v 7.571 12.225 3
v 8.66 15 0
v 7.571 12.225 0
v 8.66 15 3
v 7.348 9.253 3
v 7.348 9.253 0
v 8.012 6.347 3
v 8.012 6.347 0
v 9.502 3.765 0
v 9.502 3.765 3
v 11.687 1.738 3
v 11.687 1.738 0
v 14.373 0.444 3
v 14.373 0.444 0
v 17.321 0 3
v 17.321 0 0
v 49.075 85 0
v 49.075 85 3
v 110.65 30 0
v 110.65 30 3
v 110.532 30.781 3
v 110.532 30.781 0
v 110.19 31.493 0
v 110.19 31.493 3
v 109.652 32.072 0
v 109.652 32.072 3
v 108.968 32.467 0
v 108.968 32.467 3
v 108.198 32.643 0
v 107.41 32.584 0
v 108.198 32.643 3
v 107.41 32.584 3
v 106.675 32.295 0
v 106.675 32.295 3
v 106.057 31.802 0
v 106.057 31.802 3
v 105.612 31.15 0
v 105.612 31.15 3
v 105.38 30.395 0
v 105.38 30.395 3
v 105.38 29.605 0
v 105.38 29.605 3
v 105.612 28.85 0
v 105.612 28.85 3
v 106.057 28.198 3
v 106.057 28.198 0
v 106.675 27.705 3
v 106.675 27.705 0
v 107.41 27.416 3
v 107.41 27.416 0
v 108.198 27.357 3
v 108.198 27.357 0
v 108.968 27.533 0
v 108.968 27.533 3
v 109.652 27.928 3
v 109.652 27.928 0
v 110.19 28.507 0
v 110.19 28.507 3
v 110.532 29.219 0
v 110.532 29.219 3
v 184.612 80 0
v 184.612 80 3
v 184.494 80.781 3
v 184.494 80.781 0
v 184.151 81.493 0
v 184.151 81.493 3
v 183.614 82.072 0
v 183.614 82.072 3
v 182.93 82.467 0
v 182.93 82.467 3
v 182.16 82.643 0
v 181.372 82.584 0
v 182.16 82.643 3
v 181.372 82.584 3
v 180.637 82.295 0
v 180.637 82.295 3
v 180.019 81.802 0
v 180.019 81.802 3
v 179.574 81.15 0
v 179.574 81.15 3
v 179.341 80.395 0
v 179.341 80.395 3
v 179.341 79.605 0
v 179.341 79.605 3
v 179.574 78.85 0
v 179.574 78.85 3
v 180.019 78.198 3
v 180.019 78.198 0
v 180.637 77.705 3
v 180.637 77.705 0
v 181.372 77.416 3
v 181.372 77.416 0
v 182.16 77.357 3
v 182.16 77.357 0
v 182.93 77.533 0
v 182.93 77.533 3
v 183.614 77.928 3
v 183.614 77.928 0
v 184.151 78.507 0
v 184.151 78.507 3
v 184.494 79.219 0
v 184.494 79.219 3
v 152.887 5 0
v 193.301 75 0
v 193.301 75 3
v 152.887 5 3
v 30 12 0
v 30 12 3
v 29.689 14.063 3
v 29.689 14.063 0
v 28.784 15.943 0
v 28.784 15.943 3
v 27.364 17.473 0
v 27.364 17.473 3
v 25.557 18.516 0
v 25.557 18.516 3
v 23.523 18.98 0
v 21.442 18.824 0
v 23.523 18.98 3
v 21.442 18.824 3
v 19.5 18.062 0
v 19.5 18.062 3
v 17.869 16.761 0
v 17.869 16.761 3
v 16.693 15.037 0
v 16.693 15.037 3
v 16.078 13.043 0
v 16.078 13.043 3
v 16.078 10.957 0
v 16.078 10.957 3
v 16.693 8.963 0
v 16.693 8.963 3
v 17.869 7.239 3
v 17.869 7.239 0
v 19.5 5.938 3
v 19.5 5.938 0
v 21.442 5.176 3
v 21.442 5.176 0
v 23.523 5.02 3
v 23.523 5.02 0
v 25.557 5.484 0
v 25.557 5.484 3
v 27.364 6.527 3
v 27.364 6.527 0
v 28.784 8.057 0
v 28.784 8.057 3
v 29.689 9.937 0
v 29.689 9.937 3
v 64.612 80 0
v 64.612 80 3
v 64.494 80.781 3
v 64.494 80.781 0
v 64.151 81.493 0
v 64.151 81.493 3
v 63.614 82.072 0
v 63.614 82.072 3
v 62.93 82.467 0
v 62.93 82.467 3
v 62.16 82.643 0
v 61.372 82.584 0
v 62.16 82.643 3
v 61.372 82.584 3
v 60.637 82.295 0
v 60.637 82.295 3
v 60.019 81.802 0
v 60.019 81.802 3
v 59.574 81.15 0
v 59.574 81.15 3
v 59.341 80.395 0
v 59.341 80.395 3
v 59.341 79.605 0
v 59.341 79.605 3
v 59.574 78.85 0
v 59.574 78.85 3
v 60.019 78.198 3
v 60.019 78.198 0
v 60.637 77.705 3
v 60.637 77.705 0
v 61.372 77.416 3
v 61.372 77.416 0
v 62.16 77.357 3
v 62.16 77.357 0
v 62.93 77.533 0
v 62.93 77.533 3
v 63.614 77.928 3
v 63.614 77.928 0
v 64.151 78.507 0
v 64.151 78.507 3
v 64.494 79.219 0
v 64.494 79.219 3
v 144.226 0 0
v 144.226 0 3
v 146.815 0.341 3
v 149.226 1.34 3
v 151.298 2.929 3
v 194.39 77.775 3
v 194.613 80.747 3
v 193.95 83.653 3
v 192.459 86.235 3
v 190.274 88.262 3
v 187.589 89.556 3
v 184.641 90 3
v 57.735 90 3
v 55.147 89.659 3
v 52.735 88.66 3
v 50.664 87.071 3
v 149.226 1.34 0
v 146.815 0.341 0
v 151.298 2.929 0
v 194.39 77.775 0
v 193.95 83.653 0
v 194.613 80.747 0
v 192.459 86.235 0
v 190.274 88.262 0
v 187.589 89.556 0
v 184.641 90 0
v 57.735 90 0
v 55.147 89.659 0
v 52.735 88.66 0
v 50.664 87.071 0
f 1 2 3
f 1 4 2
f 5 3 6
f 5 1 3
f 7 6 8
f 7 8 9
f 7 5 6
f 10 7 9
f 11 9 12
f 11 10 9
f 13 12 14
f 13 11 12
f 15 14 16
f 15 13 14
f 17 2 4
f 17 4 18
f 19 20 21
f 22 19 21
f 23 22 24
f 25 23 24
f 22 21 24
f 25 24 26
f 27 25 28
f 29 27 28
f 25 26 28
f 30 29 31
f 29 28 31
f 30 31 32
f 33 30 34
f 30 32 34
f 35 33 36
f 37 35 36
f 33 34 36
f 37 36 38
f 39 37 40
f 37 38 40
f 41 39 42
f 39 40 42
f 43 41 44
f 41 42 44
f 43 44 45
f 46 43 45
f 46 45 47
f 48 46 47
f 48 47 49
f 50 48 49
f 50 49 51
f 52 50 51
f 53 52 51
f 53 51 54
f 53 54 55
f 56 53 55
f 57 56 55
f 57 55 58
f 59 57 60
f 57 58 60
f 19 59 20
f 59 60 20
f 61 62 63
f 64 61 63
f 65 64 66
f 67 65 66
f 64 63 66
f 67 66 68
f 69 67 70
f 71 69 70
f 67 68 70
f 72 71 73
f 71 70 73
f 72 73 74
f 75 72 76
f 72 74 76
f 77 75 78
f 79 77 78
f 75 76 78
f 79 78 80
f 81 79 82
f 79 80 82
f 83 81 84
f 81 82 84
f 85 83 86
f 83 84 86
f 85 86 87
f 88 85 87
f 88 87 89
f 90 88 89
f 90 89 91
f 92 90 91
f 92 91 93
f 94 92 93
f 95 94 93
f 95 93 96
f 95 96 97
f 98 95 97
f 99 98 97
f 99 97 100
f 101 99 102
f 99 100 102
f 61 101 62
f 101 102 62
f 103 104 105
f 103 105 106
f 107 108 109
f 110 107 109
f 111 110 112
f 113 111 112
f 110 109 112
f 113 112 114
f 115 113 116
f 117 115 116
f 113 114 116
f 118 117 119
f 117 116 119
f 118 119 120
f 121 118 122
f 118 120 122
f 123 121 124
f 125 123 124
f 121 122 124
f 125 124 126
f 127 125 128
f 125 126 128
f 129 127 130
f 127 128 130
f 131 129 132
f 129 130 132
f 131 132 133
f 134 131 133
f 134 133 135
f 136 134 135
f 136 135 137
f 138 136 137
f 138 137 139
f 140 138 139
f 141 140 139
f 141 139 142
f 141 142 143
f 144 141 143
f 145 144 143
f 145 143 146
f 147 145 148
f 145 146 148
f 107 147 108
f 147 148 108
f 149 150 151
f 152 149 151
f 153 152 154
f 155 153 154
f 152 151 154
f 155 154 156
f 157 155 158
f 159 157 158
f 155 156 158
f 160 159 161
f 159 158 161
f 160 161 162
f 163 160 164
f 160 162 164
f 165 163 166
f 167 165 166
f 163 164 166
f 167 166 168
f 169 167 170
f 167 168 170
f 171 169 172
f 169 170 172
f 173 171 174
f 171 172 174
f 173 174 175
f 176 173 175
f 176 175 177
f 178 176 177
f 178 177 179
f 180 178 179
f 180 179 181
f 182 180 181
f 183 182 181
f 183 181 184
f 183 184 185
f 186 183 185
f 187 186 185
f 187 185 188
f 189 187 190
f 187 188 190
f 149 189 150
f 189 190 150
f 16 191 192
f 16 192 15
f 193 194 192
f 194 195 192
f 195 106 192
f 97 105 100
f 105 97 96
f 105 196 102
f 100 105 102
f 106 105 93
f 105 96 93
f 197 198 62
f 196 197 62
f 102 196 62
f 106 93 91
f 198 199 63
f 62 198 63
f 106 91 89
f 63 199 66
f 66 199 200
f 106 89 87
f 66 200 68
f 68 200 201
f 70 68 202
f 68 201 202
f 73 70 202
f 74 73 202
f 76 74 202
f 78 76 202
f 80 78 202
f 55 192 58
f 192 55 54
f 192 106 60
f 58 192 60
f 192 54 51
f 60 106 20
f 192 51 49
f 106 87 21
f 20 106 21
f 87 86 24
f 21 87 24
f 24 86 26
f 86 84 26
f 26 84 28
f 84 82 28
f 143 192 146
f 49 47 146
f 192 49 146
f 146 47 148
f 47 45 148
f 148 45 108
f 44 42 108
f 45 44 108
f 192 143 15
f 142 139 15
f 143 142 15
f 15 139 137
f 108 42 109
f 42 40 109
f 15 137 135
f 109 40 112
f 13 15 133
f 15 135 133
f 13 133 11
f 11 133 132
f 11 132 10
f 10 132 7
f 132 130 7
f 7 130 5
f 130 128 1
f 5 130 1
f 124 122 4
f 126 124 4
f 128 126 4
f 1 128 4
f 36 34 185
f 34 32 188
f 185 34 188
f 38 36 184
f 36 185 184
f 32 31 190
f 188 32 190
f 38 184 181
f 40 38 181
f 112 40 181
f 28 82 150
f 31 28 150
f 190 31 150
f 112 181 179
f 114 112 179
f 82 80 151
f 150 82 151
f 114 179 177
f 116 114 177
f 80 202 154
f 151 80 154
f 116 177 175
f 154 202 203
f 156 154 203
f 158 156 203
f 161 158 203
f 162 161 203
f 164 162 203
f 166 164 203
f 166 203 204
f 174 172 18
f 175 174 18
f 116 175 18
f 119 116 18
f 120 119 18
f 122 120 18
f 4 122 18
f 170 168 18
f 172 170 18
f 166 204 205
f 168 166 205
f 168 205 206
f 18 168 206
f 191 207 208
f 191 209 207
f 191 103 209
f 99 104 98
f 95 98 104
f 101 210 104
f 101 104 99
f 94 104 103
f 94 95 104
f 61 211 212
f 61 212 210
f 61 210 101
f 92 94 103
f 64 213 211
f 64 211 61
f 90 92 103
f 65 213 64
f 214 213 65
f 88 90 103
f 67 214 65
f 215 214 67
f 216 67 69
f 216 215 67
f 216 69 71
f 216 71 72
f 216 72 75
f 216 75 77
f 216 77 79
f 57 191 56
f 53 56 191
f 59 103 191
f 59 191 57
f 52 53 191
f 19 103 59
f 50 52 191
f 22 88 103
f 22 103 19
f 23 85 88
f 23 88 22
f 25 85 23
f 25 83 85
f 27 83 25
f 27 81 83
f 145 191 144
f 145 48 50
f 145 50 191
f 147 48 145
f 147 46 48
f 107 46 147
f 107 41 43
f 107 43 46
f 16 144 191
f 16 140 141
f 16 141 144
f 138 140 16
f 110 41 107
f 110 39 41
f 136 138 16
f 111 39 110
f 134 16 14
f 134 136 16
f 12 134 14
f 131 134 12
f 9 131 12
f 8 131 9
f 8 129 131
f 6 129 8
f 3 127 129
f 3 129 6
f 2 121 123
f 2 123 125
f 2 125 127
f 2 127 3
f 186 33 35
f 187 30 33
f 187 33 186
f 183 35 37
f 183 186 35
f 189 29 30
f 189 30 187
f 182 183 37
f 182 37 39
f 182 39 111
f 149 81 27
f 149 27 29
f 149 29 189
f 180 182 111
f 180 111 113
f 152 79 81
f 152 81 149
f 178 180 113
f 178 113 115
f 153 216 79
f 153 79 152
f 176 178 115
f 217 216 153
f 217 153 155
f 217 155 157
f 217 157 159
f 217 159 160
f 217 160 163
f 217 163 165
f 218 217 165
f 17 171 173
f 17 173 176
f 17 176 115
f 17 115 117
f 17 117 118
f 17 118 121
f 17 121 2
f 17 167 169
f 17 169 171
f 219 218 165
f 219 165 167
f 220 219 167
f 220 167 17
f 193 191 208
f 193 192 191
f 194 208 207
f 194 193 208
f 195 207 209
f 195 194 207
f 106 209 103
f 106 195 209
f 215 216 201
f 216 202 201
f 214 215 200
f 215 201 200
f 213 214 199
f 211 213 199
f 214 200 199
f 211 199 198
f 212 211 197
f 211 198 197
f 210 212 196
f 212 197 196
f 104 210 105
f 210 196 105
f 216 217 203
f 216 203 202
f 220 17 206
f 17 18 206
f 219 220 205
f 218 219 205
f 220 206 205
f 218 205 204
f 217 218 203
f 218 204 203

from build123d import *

# Parameters (mm, degrees)
BOSS_EXTRUDE1_DEPTH = 3
SKETCH2_R           = 7
SKETCH2_R_2         = 2.65
CUT_EXTRUDE1_DEPTH  = 3
FILLET1_R           = 10


with BuildPart() as part:
    # Sketch1 → Boss-Extrude1 (new body)
    with BuildSketch(Plane.XY):
        Polygon((0, 0), (51.961524227, 90), (201.961524227, 90), (150, 0), align=None)
    extrude(amount=BOSS_EXTRUDE1_DEPTH)

    # Sketch2 → Cut-Extrude1 (cut)
    with BuildSketch(Plane.XY.offset(3)):
        with Locations((23, 12)):
            Circle(SKETCH2_R)
        with Locations((108, 30)):
            Circle(SKETCH2_R_2)
        with Locations((61.961524227, 80)):
            Circle(SKETCH2_R_2)
        with Locations((181.961524227, 80)):
            Circle(SKETCH2_R_2)
    extrude(amount=-CUT_EXTRUDE1_DEPTH, mode=Mode.SUBTRACT)

    # Fillet1
    fillet1_edges = [part.edges().sort_by_distance(p)[0] for p in [
        (0, 0, 1.5),
        (51.961524227, 90, 1.5),
        (201.961524227, 90, 1.5),
        (150, 0, 1.5),
    ]]
    fillet(fillet1_edges, radius=FILLET1_R)


solid = part.part
